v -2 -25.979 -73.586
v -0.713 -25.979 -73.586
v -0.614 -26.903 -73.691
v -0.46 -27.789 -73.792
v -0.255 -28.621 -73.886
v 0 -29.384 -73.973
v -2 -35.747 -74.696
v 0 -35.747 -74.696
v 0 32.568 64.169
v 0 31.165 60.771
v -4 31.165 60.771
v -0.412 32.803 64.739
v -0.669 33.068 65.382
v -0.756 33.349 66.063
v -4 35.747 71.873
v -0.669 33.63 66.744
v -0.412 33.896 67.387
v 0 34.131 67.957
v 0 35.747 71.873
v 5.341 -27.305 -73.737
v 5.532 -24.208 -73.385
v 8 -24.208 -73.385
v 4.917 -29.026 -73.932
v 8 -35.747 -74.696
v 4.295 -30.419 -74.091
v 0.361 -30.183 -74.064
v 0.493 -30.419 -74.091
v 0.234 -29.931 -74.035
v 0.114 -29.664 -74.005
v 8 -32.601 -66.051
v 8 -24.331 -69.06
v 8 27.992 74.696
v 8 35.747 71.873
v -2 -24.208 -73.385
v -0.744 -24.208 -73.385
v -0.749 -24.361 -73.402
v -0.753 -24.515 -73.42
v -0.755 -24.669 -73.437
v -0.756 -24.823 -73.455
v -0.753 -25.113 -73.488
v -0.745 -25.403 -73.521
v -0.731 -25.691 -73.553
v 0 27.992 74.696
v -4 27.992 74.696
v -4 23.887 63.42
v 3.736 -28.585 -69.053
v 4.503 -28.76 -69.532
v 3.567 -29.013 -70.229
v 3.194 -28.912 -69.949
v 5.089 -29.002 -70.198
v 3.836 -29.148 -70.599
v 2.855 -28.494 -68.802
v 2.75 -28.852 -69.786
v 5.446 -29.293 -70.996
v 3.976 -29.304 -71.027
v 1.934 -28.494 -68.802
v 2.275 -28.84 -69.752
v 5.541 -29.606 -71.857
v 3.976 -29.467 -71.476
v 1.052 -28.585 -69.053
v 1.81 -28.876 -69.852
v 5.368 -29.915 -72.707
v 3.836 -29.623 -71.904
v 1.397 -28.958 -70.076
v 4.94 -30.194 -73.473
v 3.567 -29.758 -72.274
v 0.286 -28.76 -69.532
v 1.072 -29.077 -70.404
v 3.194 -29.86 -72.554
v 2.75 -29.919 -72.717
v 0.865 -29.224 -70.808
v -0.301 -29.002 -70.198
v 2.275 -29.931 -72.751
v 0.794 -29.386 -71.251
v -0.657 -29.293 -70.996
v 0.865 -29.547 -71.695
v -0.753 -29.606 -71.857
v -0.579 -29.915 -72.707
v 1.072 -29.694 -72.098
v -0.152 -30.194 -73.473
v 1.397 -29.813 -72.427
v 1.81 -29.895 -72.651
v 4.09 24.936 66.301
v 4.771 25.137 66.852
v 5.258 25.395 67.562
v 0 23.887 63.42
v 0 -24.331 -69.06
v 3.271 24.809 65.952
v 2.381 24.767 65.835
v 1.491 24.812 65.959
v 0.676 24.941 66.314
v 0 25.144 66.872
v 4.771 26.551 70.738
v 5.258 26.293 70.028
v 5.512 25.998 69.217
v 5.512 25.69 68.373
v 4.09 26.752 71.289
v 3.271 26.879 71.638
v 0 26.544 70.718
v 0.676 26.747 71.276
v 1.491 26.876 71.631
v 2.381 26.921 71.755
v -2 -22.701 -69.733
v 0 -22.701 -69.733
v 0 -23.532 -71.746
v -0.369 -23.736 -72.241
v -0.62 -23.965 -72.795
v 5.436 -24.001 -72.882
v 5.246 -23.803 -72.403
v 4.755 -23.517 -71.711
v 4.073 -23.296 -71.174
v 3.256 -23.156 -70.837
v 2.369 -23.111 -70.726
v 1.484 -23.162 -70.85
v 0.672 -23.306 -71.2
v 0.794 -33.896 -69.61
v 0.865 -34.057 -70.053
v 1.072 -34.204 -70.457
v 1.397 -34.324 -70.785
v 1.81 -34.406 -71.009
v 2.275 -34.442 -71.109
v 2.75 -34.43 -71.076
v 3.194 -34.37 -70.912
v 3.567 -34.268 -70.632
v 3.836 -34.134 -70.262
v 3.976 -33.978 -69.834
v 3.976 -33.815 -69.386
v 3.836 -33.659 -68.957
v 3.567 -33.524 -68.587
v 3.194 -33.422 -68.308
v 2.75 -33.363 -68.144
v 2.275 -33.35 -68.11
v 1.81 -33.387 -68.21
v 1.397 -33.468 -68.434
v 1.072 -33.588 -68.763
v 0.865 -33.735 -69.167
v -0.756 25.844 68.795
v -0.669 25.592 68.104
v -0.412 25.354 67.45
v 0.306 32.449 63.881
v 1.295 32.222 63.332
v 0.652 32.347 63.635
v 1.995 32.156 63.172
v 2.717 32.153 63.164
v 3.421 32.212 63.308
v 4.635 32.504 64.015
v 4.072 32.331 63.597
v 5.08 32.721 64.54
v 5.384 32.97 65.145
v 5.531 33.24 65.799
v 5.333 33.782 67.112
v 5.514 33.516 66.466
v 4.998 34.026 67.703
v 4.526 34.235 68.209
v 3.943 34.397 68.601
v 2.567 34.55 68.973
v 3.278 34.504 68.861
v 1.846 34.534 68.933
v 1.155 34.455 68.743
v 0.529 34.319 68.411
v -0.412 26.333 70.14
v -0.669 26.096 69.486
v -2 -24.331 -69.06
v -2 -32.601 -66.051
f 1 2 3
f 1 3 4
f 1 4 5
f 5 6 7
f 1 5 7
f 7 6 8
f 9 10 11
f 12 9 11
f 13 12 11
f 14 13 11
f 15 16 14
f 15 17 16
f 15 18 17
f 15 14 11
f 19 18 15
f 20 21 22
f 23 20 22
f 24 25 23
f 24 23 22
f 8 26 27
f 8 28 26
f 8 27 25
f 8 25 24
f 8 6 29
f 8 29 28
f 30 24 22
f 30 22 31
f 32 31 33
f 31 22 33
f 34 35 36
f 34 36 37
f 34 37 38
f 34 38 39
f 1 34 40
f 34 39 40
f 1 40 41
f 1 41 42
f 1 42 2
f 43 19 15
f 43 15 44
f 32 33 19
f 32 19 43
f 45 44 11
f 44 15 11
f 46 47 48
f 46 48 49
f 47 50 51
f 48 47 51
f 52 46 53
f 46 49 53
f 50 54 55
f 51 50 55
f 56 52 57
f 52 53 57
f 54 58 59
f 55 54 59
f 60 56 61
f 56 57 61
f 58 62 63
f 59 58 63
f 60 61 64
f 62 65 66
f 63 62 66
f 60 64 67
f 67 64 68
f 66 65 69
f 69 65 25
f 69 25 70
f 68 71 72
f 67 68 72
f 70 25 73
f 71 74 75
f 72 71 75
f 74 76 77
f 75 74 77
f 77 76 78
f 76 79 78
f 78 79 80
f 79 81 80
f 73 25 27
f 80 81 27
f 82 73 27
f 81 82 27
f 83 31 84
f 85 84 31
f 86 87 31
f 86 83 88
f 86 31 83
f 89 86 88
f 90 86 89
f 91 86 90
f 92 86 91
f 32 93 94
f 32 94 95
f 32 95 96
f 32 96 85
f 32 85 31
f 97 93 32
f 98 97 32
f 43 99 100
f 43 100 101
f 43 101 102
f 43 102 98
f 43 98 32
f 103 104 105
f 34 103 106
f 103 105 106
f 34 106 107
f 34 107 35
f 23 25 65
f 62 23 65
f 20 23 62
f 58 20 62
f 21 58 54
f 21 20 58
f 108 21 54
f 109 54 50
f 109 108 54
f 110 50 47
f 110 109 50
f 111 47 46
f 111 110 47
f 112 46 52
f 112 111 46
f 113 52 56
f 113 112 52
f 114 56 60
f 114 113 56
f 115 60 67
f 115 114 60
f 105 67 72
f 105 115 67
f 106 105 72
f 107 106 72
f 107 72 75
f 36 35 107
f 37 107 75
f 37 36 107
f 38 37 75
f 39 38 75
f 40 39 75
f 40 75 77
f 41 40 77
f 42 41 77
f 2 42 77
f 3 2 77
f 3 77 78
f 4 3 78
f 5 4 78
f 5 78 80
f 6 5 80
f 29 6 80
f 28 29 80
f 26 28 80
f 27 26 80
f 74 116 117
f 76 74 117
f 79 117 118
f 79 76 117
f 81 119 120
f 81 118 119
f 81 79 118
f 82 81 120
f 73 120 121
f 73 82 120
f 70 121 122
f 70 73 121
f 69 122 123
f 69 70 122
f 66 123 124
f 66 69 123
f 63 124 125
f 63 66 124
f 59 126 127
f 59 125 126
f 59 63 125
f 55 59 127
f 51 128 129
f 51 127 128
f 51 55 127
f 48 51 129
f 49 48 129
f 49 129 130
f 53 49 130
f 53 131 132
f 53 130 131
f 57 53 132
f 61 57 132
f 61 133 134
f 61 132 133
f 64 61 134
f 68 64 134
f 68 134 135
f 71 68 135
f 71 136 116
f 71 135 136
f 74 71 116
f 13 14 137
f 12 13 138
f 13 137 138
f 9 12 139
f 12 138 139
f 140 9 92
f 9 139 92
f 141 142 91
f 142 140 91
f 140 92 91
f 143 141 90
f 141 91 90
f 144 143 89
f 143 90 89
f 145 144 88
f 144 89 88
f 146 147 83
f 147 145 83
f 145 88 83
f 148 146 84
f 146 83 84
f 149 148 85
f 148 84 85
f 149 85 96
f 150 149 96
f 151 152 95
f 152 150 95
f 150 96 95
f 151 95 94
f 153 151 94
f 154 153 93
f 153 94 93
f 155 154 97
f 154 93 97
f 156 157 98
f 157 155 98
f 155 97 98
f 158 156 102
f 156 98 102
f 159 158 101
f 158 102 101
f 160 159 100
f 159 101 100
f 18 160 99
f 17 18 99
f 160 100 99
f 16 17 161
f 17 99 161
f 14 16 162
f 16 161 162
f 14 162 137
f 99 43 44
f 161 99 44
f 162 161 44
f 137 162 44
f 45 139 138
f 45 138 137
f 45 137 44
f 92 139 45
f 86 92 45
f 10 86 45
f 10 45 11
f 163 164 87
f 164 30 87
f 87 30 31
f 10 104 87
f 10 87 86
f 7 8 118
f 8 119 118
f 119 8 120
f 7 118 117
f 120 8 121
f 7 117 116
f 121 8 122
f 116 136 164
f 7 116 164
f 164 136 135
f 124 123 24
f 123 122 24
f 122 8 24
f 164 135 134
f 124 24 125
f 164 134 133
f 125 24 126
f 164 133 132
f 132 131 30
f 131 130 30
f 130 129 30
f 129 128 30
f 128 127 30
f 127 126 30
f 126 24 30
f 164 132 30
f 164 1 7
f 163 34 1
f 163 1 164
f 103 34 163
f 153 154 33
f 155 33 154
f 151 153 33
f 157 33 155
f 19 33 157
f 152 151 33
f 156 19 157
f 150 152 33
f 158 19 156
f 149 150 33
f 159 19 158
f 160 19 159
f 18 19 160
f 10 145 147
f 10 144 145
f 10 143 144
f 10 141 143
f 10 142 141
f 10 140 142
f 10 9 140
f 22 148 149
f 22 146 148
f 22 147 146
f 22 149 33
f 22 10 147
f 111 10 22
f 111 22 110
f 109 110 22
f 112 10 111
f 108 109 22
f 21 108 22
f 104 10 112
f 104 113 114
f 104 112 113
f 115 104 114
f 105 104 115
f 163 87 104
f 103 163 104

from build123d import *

# Parameters (mm, degrees)
BOSS_EXTRUDE1_DEPTH     = 8
BOSS_EXTRUDE2_DEPTH     = 4
BOSS_EXTRUDE3_DEPTH     = 2
CUT_EXTRUDE1_DEPTH      = 12
CUT_EXTRUDE1_DEPTH_BACK = 84.733662739
SKETCH4_R               = 1.6
SKETCH5_R               = 3.149940151
CUT_EXTRUDE2_DEPTH      = 10
CUT_EXTRUDE3_START      = 9
SKETCH5_2_R             = 3.149940151
CUT_EXTRUDE3_DEPTH      = 9


with BuildPart() as part:
    # Sketch1 → Boss-Extrude1 (new body)
    with BuildSketch(Plane(origin=(0, 0, 0), x_dir=(0, 0, -1), z_dir=(1, 0, 0))):
        Polygon((-74.695832275, 27.991563326), (-71.872967623, 35.747320216), (73.384955245, -24.208131169), (74.695832275, -35.747320216), (66.050660164, -32.600734897), (69.060437425, -24.331439834), align=None)
    extrude(amount=BOSS_EXTRUDE1_DEPTH)

    # Sketch2 → Boss-Extrude2 (add)
    with BuildSketch(Plane.ZY):
        Polygon((74.695832275, 27.991563326), (63.419520826, 23.887321606), (60.770717842, 31.164847991), (71.872967623, 35.747320216), align=None)
    extrude(amount=BOSS_EXTRUDE2_DEPTH)

    # Sketch6 → Boss-Extrude3 (add)
    with BuildSketch(Plane.ZY):
        Polygon((-74.695832275, -35.747320216), (-66.050660164, -32.600734897), (-69.060437425, -24.331439834), (-69.733422771, -22.700955013), (-73.384955245, -24.208131169), (-73.586089176, -25.978642362), align=None)
    extrude(amount=BOSS_EXTRUDE3_DEPTH)

    # Sketch4 → Cut-Extrude1 (cut, two sides: drawn at the far end of the back side and taken through both)
    with BuildSketch(Plane(origin=(0, 0.710394692, -0.258562522), x_dir=(-1, 0, 0), z_dir=(0, -0.9396926207859069, 0.3420201433256729)).offset(-CUT_EXTRUDE1_DEPTH_BACK)):
        with Locations((-2.394217395, -73.485294271)):
            Circle(SKETCH4_R)
        with Locations((-2.394217395, 77.00491749)):
            Circle(SKETCH4_R)
    extrude(amount=CUT_EXTRUDE1_DEPTH + CUT_EXTRUDE1_DEPTH_BACK, mode=Mode.SUBTRACT)

    # Sketch5 → Cut-Extrude2 (cut)
    with BuildSketch(Plane(origin=(0, 5.408857796, -1.968663239), x_dir=(-1, 0, 0), z_dir=(0, -0.9396926207859069, 0.3420201433256729))):
        with Locations((-2.394217395, -73.485294271)):
            Circle(SKETCH5_R)
        with Locations((-2.394217395, 77.514705729)):
            Circle(SKETCH5_R)
    extrude(amount=-CUT_EXTRUDE2_DEPTH, mode=Mode.SUBTRACT)

    # Sketch5<2> → Cut-Extrude3 (cut)
    with BuildSketch(Plane(origin=(0, 5.408857796, -1.968663239), x_dir=(-1, 0, 0), z_dir=(0, -0.9396926207859069, 0.3420201433256729)).offset(CUT_EXTRUDE3_START)):
        with Locations((-2.394217395, -73.485294271)):
            Circle(SKETCH5_2_R)
        with Locations((-2.394217395, 77.514705729)):
            Circle(SKETCH5_2_R)
    extrude(amount=-CUT_EXTRUDE3_DEPTH, mode=Mode.SUBTRACT)


solid = part.part
